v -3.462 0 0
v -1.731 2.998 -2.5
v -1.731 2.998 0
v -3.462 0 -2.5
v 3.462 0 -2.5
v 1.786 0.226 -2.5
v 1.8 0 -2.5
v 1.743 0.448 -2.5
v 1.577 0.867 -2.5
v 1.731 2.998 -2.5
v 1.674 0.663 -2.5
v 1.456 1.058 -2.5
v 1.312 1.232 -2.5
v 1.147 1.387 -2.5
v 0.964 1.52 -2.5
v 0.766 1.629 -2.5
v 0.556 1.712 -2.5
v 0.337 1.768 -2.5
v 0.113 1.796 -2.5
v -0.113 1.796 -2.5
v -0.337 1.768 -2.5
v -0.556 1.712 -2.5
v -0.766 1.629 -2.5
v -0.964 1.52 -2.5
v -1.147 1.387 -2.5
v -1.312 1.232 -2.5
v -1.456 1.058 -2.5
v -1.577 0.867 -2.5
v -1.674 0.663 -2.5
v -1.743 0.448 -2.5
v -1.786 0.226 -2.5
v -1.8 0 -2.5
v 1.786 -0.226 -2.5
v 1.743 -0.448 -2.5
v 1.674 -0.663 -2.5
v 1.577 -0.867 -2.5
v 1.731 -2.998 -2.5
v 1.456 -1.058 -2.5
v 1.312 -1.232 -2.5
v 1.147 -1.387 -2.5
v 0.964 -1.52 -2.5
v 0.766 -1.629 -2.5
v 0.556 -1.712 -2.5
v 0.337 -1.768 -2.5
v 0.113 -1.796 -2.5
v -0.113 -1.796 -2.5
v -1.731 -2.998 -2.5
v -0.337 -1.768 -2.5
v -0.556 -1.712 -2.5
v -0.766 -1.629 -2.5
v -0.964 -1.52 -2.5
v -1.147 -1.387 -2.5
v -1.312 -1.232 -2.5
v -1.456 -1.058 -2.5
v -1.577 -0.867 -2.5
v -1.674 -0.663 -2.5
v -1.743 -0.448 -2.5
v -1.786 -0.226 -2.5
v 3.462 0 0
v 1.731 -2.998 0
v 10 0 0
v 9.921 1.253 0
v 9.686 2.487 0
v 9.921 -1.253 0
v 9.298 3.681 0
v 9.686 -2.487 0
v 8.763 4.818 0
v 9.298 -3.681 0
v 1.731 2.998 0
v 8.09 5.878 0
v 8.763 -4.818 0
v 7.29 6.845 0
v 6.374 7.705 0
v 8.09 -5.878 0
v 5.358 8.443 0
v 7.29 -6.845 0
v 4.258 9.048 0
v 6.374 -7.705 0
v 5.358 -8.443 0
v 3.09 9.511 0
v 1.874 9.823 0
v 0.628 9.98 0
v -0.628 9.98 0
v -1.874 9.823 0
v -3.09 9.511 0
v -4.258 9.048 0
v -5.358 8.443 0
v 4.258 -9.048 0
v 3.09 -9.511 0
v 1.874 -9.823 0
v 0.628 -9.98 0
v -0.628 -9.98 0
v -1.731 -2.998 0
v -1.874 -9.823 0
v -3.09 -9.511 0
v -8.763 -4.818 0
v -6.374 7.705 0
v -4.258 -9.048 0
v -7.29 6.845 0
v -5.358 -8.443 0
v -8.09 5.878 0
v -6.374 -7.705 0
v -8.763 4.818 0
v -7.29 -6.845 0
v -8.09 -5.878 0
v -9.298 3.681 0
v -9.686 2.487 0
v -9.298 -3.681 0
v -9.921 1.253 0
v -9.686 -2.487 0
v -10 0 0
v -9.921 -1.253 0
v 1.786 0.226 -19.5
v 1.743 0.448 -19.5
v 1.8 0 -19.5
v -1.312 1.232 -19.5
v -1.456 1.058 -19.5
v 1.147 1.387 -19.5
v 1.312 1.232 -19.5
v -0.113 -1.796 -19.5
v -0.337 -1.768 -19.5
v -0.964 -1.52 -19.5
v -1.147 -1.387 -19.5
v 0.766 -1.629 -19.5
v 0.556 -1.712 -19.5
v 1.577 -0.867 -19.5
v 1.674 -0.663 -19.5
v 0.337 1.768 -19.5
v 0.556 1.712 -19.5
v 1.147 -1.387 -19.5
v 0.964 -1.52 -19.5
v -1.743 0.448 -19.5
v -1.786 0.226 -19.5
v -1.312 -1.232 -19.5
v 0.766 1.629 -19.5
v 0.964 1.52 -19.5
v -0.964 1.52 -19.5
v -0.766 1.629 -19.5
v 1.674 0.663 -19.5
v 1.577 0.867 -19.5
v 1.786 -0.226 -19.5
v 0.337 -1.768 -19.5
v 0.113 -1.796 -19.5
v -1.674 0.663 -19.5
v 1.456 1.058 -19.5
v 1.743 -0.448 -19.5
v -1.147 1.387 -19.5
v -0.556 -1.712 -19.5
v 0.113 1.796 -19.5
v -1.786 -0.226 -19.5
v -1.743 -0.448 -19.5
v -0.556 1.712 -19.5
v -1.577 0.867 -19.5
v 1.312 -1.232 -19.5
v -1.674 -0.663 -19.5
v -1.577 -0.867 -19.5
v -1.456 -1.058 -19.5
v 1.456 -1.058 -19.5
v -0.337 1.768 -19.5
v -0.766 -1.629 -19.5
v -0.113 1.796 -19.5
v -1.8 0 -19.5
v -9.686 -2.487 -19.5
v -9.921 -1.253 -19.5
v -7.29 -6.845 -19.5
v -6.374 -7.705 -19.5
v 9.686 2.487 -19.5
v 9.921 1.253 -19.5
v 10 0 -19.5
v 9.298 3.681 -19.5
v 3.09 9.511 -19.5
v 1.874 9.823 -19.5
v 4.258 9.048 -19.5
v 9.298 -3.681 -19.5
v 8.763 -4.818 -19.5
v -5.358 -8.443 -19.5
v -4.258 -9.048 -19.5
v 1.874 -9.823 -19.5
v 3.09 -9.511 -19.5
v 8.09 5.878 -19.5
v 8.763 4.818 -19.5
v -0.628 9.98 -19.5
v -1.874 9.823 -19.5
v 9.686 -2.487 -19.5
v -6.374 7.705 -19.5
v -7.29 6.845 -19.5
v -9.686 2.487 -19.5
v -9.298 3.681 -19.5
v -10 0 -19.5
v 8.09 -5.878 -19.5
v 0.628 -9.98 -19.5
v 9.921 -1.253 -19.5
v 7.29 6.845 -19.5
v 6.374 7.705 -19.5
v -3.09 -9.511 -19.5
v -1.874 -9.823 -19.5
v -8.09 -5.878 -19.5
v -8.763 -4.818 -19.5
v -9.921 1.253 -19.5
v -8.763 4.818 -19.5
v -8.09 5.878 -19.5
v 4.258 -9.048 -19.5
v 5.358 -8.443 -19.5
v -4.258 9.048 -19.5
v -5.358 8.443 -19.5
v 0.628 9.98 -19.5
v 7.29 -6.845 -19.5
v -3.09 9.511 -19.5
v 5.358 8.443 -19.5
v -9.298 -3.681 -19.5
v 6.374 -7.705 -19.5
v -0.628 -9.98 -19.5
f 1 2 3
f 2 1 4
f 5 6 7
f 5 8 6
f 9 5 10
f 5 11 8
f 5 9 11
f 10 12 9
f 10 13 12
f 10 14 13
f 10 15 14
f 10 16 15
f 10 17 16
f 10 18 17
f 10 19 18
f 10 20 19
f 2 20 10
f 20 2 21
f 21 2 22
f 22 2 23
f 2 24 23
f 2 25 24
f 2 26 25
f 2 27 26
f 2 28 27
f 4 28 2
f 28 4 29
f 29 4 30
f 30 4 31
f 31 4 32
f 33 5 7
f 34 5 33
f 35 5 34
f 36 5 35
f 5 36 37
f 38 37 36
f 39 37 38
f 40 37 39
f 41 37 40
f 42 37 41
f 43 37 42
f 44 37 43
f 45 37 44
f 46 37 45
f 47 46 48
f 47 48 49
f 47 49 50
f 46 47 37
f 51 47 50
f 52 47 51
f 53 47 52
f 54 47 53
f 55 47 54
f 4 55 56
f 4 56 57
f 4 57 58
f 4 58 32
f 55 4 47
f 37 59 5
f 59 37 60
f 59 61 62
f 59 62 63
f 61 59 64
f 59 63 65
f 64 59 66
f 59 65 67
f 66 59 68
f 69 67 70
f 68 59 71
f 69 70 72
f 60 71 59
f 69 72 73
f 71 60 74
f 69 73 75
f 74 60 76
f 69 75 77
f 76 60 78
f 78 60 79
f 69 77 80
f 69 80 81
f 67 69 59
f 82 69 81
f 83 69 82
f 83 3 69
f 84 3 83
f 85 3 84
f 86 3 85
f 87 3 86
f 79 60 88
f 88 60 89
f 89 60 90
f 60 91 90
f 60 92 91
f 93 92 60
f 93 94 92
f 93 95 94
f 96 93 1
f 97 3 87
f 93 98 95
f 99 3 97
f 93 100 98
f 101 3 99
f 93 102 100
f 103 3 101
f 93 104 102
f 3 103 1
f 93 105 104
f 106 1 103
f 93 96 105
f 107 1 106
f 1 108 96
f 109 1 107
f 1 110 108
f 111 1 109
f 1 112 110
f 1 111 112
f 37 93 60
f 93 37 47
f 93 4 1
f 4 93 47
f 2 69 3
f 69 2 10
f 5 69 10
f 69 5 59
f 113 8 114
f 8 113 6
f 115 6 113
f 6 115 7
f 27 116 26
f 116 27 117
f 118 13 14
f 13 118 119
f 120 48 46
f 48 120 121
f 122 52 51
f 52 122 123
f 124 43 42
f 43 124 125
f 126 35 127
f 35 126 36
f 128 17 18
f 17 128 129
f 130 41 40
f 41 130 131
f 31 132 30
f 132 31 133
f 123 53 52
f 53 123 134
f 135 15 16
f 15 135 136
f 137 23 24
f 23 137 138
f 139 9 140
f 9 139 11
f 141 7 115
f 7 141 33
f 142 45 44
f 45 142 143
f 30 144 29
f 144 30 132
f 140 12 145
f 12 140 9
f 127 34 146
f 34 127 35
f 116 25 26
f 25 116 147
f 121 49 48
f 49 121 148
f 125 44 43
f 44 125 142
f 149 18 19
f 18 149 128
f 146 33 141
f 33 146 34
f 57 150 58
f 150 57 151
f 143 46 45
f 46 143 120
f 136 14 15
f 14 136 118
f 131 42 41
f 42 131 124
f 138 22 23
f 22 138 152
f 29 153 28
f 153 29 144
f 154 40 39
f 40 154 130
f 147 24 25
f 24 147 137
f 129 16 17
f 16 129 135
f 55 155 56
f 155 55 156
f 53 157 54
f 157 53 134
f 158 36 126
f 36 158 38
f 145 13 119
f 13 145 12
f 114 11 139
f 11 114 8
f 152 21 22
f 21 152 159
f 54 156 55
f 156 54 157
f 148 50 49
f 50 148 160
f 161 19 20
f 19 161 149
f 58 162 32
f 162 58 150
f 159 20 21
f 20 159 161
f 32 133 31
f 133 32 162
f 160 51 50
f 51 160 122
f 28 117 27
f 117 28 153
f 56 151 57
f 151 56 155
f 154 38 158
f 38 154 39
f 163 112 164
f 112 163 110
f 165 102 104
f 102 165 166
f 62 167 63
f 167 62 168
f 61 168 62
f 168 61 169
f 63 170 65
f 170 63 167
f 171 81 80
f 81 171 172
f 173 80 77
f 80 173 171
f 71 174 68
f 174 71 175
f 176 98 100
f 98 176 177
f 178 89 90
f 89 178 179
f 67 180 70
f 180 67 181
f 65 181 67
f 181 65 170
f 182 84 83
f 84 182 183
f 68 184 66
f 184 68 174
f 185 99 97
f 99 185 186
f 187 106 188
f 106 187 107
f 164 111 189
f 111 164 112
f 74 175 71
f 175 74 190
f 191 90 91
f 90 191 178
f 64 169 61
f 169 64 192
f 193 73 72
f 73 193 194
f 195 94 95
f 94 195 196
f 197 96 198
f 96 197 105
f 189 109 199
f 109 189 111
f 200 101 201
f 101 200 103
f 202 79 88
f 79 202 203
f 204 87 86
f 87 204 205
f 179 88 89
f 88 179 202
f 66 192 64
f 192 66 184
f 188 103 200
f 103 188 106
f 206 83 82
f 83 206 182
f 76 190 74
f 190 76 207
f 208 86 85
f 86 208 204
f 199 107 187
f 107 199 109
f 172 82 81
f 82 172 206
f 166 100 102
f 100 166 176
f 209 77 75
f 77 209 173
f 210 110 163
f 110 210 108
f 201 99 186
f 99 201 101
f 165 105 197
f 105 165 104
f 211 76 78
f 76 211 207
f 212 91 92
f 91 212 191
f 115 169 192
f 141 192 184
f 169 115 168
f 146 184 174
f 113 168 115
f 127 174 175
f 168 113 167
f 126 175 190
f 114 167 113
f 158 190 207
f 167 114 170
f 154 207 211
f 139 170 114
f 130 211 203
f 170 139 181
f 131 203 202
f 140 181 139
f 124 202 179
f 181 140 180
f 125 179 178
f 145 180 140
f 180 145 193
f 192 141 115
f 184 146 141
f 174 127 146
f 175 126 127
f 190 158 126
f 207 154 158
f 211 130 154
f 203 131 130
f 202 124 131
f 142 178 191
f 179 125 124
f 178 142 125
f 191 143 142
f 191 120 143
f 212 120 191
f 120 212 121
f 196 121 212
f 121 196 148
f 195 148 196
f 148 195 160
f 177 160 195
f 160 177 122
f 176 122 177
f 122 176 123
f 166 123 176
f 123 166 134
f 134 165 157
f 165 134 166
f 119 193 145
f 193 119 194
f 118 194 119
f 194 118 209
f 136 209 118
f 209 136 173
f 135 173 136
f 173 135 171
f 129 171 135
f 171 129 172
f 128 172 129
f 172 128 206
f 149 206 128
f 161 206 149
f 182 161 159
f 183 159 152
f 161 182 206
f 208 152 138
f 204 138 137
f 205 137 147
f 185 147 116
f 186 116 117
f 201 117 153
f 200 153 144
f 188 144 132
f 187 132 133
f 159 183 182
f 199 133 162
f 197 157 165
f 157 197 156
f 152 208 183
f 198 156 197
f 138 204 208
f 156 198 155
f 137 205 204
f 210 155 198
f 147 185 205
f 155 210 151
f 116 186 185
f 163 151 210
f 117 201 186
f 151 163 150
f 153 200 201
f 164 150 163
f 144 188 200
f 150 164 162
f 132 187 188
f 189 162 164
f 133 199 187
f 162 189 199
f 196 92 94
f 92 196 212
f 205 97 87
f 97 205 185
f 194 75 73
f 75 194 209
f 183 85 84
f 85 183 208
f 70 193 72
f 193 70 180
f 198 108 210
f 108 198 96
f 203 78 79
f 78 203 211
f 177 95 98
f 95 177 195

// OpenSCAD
$fn = 50;


difference() {
	union() {
		translate(v = [0, 0, -19.5000000000]) {
			cylinder(h = 19.5000000000, r = 10.0000000000);
		}
	}
	union() {
		translate(v = [0, 0, 0]) {
			rotate(a = [0, 0, 0]) {
				difference() {
					union() {
						translate(v = [0, 0, -2.5000000000]) {
							linear_extrude(height = 2.5000000000) {
								polygon(points = [[3.4620000000, 0.0000000000], [1.7310000000, 2.9981799479], [-1.7310000000, 2.9981799479], [-3.4620000000, 0.0000000000], [-1.7310000000, -2.9981799479], [1.7310000000, -2.9981799479]]);
							}
						}
					}
					union();
				}
			}
		}
		#translate(v = [0, 0, -100.0000000000]) {
			cylinder(h = 200, r = 1.8000000000);
		}
	}
}
